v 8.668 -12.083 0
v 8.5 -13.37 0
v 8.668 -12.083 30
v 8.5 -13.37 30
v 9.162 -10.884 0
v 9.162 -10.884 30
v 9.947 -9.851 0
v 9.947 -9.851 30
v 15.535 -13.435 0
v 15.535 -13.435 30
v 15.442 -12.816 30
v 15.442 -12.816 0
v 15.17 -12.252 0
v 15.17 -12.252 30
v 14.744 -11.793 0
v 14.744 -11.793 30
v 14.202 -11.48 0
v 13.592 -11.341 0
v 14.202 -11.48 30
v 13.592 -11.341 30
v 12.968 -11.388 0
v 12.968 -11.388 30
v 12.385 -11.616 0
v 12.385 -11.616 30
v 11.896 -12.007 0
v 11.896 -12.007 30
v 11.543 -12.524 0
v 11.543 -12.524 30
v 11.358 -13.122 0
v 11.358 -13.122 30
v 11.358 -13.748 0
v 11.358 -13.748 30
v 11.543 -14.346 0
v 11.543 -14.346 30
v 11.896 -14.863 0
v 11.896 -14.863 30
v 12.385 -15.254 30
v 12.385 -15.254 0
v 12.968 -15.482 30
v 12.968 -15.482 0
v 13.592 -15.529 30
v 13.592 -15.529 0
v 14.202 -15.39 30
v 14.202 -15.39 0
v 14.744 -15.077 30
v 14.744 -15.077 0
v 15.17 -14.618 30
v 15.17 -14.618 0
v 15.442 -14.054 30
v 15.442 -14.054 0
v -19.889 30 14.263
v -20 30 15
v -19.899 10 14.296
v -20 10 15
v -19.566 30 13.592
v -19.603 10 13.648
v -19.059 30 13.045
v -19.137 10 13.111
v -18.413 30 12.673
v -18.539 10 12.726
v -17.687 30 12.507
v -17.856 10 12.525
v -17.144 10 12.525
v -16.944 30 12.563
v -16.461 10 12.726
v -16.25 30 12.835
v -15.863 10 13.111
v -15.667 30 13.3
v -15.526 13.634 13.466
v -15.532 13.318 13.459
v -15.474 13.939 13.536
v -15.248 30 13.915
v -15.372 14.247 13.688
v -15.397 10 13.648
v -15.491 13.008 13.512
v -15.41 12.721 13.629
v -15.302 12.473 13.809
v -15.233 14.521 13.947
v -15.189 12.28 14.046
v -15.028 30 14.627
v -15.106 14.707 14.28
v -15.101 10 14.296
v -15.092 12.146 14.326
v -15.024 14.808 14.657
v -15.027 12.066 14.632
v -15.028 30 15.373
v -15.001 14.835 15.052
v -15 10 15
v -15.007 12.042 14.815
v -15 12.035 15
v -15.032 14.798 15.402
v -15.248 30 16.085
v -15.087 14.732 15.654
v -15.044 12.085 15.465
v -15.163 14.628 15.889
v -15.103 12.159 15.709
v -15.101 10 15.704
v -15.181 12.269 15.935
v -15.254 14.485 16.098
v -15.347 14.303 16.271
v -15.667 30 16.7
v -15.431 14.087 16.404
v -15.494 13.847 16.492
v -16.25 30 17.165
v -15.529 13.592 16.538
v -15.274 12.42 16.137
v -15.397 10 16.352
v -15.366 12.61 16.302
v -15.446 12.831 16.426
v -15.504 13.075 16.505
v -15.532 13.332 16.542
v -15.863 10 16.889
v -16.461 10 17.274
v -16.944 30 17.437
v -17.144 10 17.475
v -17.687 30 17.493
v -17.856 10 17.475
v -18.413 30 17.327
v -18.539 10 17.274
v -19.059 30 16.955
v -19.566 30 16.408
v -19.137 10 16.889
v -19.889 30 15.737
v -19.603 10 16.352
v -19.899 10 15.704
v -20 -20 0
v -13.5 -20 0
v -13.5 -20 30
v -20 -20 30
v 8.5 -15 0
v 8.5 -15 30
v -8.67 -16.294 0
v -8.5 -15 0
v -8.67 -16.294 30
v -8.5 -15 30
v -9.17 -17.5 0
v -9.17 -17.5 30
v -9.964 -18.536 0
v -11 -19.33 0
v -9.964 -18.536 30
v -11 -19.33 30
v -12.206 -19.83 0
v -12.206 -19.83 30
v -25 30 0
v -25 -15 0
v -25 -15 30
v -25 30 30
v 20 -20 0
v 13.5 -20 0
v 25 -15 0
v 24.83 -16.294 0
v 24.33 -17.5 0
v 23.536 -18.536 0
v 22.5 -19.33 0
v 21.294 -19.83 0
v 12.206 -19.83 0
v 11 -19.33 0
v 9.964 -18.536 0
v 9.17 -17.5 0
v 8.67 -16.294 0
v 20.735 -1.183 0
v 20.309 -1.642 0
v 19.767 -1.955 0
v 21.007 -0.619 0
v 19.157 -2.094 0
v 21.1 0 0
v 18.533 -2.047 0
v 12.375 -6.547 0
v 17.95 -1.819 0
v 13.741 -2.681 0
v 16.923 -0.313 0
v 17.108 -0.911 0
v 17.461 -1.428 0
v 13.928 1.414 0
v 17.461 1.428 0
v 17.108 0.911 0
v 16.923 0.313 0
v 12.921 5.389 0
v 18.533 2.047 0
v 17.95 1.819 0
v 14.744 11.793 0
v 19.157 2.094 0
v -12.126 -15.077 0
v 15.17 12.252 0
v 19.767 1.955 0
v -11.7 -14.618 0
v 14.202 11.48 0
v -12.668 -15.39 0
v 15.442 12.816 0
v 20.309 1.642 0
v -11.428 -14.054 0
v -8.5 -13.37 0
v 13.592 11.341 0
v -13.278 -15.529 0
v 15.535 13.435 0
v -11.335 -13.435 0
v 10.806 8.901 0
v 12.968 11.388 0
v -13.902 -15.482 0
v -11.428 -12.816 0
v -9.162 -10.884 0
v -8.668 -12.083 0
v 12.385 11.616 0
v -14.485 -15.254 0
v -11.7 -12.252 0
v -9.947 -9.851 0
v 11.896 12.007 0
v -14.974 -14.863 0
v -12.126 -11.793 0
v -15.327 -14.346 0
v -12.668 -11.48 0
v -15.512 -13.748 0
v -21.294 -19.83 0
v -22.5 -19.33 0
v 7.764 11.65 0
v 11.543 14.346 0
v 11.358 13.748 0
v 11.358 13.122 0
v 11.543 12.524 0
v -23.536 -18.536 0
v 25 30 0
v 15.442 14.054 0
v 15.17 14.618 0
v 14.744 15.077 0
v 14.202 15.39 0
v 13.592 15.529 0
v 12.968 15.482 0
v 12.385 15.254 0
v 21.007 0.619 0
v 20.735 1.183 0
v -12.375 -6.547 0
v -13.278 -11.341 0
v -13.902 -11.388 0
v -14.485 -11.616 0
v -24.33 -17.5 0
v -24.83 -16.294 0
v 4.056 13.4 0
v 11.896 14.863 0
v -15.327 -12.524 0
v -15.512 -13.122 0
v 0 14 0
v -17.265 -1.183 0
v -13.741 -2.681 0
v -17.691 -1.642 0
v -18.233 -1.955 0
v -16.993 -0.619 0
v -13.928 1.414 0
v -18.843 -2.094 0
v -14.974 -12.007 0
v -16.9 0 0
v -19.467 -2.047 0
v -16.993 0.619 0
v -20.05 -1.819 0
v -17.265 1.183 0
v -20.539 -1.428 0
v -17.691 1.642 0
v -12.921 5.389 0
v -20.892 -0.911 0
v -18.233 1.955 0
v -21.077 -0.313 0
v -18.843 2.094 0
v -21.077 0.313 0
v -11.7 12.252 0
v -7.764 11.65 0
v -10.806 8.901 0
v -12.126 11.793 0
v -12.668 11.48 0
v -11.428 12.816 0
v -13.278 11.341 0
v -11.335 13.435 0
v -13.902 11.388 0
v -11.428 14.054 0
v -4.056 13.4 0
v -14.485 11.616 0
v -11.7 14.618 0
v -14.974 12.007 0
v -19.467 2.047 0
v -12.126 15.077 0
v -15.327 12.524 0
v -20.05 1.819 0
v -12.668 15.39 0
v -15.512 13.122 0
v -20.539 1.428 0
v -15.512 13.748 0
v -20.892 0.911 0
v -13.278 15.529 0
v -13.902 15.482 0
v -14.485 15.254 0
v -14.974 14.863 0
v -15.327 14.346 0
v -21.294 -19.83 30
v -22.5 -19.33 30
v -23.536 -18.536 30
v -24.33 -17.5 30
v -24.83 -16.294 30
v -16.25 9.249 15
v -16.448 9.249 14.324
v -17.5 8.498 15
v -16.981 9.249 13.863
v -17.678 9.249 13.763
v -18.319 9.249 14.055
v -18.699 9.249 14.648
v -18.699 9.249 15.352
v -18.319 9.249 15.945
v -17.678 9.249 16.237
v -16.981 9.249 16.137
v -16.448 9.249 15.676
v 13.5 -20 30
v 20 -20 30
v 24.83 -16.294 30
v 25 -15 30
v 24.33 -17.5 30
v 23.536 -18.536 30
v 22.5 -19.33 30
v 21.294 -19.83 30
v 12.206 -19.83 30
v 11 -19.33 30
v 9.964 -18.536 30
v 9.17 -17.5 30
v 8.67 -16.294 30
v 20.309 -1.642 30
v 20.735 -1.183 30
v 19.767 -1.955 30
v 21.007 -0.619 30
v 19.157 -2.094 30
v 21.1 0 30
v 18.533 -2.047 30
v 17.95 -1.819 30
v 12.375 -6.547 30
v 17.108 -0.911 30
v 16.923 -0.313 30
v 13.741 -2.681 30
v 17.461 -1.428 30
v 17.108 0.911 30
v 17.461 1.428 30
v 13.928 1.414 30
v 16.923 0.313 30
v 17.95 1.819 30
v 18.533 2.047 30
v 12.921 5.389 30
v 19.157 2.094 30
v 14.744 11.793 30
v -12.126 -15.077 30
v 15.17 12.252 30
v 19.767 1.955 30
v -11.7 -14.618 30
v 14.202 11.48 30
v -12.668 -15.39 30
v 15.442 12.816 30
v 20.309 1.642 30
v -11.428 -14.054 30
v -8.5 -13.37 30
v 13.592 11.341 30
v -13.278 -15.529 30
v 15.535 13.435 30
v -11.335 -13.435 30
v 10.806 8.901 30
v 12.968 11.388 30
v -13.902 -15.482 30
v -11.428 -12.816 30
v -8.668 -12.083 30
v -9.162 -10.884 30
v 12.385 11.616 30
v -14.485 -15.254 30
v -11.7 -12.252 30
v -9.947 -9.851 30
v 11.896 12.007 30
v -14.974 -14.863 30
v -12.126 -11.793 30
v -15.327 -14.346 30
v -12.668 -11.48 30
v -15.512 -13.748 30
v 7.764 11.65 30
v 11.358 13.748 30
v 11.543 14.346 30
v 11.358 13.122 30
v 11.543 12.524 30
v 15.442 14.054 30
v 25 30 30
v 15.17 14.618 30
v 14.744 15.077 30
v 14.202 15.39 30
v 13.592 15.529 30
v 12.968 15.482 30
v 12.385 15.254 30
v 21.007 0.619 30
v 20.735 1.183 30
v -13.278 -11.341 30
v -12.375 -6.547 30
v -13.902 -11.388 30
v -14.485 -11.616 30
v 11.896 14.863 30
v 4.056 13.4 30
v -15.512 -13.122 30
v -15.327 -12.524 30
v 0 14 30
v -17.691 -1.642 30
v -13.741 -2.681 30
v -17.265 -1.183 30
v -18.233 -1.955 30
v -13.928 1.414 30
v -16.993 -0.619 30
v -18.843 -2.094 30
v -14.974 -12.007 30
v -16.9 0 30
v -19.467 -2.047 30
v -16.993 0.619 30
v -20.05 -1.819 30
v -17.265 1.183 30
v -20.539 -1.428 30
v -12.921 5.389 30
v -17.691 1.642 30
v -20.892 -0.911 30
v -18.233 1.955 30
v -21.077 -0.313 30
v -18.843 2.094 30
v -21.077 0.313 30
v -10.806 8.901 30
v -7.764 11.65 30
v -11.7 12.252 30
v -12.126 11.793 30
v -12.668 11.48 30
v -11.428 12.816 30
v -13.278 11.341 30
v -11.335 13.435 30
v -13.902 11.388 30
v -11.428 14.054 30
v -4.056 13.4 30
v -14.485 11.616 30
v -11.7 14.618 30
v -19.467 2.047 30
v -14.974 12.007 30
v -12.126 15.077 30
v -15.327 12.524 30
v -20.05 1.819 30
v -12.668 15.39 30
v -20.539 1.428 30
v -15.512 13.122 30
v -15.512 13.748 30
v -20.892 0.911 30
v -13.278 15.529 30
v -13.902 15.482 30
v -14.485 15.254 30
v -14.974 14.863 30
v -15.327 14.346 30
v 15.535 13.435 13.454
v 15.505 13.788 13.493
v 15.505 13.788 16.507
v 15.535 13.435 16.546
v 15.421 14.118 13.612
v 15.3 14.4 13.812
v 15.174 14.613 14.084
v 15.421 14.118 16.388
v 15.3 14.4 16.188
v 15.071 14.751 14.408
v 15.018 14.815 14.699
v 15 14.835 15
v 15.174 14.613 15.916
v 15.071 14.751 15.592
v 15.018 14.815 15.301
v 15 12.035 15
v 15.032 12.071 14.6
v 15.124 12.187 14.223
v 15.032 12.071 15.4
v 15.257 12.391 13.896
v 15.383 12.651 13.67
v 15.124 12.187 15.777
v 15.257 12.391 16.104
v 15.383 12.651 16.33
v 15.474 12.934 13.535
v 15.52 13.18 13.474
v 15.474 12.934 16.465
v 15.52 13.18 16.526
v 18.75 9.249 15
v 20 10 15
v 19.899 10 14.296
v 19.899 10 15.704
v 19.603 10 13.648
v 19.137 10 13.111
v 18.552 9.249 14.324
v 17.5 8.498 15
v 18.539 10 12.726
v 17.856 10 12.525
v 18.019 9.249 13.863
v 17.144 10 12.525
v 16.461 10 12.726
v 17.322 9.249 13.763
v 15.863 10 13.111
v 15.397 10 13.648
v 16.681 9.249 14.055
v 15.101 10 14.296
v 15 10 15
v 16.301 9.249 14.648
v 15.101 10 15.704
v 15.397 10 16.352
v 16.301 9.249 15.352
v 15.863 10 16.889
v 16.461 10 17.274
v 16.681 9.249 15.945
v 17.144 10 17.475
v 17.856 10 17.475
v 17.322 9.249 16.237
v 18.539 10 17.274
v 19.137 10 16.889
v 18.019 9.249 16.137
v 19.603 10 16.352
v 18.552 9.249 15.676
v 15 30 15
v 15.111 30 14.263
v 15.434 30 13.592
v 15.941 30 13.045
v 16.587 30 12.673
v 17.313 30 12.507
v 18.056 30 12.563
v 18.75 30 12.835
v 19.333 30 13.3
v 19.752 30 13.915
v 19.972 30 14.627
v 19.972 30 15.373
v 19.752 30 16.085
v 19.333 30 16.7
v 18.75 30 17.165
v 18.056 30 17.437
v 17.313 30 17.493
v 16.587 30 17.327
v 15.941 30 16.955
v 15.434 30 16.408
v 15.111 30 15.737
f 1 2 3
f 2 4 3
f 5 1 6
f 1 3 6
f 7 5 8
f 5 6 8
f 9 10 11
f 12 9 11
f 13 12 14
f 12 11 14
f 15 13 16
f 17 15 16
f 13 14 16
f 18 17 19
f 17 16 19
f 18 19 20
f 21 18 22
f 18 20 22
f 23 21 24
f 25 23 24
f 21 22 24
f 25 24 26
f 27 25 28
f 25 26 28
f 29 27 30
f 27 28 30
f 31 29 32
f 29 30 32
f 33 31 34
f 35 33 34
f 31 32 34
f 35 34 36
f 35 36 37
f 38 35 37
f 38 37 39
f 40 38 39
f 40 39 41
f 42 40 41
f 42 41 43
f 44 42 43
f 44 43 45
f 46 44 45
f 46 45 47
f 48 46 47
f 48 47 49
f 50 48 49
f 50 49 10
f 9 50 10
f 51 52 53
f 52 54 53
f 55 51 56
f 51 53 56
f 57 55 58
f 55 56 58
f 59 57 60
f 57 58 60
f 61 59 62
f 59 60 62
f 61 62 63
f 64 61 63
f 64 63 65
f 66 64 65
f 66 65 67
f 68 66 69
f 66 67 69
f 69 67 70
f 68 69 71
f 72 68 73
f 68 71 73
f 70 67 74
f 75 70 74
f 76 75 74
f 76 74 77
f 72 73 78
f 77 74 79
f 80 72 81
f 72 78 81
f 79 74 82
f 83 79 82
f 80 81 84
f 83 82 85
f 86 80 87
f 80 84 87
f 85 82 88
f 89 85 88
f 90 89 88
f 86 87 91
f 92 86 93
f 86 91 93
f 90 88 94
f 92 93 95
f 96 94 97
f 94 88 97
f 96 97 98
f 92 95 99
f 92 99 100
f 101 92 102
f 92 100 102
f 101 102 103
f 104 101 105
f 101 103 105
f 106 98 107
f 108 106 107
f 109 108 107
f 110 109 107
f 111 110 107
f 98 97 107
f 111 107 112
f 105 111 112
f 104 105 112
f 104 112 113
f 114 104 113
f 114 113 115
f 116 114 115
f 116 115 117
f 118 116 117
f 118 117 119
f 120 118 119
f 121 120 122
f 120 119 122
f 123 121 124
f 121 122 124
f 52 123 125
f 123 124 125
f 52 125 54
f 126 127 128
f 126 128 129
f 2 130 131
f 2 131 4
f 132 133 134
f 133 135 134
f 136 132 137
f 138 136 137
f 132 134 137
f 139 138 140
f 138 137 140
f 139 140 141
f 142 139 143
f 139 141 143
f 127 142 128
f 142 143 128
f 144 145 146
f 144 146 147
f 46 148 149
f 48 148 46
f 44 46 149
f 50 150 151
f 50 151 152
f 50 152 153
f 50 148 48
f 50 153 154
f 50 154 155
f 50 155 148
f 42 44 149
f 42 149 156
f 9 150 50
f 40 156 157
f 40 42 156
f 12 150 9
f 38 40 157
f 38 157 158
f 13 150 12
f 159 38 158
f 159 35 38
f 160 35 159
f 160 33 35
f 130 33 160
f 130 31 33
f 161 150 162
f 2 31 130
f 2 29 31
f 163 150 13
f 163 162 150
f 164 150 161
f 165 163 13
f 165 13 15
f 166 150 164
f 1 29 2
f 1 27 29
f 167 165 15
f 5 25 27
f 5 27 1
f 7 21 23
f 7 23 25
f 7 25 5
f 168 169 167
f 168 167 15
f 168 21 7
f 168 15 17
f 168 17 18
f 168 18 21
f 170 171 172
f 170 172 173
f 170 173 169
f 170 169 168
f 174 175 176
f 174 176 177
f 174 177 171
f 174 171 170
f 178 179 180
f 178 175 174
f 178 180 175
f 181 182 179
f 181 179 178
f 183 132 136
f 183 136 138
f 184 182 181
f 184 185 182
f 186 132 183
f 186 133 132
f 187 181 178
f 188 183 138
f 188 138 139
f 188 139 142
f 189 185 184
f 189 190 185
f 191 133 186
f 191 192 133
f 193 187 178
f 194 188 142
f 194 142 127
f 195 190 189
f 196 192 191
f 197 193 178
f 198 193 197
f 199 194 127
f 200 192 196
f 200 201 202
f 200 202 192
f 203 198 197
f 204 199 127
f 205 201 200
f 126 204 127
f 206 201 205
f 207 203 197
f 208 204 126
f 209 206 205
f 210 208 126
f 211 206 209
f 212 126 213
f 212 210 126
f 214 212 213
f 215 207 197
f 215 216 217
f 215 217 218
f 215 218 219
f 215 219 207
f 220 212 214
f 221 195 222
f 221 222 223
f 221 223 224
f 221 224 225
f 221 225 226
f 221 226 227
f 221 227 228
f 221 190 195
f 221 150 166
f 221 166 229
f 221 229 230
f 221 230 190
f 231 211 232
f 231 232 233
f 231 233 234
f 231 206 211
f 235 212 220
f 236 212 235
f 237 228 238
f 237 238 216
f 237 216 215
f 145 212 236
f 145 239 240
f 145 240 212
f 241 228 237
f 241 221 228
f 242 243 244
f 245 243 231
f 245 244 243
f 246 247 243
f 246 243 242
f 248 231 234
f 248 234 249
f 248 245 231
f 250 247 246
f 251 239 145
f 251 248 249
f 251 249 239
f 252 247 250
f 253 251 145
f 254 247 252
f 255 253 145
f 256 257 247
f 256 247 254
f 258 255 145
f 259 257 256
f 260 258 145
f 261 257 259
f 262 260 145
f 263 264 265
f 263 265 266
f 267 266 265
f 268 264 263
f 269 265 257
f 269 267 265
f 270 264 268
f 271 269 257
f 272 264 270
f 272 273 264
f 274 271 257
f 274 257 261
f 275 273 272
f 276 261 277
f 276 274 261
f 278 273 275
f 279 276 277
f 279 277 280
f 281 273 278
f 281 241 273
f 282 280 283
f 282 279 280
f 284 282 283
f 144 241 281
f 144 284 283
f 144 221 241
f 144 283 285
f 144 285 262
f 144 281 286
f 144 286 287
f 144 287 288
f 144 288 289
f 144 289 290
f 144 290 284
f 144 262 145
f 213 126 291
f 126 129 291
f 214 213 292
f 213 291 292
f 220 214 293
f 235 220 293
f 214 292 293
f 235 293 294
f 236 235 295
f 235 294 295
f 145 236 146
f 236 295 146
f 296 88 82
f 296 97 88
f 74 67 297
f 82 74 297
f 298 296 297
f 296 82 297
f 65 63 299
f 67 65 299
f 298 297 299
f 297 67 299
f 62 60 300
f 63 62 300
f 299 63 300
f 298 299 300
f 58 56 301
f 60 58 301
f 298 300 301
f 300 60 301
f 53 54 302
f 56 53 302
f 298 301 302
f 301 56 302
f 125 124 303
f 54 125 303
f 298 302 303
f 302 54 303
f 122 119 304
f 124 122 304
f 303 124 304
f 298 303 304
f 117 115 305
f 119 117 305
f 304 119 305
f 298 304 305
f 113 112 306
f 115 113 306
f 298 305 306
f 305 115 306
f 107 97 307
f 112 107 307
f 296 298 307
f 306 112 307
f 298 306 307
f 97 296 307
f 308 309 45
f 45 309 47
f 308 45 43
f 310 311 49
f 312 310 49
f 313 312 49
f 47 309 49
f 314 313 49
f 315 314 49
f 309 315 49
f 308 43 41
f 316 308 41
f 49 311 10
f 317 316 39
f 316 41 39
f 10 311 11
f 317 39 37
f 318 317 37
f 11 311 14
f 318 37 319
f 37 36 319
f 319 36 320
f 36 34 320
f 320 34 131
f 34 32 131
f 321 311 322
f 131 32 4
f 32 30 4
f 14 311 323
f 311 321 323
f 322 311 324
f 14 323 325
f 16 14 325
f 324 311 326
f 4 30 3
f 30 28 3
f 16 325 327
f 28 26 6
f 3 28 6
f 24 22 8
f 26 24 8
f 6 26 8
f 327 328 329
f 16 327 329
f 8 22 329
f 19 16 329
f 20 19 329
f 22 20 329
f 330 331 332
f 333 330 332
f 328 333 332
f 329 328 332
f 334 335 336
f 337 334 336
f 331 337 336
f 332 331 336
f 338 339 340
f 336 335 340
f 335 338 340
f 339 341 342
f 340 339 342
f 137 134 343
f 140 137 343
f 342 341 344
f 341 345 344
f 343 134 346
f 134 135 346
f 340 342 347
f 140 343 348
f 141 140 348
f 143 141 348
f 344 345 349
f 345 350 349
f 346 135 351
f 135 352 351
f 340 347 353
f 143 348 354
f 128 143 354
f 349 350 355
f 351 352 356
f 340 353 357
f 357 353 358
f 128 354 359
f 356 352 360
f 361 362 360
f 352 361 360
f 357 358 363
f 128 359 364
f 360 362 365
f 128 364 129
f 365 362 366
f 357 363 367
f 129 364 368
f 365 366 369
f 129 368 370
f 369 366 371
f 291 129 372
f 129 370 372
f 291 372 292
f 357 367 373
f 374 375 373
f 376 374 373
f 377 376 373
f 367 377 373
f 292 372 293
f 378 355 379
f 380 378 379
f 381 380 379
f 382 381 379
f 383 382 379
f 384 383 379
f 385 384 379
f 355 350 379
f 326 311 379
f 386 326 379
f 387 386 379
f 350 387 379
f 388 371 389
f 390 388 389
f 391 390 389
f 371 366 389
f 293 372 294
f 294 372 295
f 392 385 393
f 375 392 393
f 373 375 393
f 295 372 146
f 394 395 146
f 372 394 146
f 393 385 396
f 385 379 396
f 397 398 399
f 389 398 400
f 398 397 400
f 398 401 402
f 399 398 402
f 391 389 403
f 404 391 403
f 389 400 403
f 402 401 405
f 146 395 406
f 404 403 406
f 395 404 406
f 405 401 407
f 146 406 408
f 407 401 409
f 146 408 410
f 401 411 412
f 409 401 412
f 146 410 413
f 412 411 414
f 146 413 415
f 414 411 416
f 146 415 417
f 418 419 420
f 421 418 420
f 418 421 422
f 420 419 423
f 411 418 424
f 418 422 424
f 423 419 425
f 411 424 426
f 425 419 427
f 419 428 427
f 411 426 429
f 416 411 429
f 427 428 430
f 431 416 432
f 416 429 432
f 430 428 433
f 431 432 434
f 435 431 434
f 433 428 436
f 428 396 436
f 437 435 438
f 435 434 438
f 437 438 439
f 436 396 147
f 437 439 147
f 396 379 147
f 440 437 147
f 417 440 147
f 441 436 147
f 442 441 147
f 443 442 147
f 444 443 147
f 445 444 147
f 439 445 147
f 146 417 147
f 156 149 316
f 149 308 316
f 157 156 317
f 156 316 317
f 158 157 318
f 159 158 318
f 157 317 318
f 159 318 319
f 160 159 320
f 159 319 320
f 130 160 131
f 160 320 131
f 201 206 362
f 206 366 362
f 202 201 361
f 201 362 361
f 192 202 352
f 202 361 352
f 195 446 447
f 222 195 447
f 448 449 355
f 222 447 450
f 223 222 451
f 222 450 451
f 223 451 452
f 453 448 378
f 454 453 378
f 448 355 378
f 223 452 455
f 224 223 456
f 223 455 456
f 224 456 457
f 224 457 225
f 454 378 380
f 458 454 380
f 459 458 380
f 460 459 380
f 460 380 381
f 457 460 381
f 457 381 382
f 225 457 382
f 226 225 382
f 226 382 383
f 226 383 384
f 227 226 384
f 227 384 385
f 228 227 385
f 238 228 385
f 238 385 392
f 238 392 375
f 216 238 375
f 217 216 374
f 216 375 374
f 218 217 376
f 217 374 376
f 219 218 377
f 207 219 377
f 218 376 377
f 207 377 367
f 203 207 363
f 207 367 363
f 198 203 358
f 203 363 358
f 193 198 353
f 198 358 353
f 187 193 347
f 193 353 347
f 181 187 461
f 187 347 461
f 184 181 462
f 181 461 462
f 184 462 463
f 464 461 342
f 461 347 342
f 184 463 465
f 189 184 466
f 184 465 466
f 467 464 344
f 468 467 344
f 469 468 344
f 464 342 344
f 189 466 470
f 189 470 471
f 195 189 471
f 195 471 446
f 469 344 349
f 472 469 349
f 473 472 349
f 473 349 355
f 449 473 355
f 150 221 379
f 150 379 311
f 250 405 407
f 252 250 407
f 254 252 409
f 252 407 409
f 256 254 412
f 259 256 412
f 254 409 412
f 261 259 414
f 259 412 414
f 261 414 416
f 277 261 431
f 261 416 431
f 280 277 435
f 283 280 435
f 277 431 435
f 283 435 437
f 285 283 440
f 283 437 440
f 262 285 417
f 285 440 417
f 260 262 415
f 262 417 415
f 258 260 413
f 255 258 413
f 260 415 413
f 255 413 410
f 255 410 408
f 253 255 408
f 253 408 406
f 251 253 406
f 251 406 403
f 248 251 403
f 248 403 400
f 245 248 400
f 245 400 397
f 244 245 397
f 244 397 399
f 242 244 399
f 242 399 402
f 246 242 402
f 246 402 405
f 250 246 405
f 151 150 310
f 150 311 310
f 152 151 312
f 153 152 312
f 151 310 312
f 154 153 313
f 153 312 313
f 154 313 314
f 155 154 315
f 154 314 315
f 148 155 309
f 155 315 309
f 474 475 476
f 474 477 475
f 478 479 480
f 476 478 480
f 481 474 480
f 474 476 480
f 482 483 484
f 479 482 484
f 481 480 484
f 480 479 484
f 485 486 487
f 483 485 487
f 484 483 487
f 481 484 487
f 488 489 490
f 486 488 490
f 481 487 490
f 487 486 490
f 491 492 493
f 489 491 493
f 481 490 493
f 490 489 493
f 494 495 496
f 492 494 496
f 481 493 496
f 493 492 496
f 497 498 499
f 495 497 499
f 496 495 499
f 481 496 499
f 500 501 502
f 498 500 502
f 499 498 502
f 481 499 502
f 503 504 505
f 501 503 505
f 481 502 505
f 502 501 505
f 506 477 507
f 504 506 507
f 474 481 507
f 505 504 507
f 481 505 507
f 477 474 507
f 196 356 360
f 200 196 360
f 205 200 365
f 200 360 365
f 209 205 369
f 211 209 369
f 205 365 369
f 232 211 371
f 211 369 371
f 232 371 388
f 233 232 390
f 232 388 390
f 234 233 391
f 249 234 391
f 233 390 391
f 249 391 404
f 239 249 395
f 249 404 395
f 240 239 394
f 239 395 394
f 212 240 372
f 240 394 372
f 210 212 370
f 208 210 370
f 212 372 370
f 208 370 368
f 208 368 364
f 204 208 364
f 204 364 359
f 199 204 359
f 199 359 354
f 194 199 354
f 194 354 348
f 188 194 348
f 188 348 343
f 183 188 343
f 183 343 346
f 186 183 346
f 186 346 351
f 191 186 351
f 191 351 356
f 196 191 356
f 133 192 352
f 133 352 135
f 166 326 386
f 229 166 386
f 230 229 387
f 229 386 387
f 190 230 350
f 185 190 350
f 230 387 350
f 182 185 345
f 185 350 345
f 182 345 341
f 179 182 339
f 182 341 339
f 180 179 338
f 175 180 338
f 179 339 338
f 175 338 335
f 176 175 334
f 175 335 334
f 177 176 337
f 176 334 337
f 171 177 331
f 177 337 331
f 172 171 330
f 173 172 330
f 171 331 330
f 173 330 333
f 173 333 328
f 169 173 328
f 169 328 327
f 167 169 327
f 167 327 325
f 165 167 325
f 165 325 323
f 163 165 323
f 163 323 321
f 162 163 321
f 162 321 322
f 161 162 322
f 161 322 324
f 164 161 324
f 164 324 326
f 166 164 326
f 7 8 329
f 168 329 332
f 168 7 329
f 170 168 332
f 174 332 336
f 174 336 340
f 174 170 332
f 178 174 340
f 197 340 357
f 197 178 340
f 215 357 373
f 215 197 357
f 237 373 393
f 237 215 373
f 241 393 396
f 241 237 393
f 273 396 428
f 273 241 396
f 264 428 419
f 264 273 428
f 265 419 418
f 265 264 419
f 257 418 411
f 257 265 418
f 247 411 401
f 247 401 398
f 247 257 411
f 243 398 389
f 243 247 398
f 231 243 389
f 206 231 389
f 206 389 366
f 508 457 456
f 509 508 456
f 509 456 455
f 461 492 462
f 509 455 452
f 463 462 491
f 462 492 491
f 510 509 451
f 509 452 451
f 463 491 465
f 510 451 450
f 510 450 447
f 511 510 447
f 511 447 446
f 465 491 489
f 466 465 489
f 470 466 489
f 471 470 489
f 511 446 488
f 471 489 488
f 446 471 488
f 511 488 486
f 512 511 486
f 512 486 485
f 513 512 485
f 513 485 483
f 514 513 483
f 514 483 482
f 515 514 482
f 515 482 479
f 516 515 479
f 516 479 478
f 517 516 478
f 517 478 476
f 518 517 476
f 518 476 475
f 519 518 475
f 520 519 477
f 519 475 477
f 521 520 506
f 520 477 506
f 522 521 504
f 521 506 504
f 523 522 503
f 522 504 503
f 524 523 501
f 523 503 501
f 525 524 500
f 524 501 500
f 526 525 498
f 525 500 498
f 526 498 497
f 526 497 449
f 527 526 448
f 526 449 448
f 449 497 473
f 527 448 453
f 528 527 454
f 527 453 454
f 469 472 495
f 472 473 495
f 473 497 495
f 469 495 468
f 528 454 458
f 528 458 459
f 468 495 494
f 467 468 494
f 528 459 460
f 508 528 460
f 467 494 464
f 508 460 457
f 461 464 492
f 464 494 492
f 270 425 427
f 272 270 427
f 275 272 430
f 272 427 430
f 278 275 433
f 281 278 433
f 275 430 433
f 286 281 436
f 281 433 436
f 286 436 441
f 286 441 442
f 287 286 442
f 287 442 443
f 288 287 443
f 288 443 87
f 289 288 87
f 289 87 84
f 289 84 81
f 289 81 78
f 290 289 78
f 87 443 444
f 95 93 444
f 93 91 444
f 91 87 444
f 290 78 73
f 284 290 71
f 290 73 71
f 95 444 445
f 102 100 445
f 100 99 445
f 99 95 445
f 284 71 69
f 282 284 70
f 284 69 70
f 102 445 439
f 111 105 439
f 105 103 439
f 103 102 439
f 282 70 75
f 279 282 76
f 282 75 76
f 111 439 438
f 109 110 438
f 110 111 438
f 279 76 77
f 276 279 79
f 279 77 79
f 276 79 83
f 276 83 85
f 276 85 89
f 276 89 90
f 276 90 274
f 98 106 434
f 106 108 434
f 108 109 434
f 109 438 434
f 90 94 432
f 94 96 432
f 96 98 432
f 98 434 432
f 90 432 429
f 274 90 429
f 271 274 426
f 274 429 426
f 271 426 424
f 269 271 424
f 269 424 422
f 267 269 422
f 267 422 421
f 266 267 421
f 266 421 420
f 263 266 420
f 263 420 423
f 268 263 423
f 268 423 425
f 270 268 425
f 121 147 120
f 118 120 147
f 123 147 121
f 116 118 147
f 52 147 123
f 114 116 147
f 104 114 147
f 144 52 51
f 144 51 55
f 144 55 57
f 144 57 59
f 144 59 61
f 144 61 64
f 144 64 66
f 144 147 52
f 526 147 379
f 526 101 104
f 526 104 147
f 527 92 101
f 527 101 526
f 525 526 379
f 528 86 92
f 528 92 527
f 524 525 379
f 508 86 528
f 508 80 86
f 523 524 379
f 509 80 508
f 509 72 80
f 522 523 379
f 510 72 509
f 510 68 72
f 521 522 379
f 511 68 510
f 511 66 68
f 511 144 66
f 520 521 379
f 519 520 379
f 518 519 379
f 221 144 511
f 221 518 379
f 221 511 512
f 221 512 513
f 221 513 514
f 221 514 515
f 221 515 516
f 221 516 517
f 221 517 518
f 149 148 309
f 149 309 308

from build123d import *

# Parameters (mm, degrees)
EXTRUDE1_DEPTH        = 30
FILLET1_R             = 5
M5_TAPPED_HOLE1_D     = 4.2
M6_TAPPED_HOLE1_D     = 5
M6_TAPPED_HOLE1_DEPTH = 20
M6_TAPPED_HOLE1_TIP   = 1.502151548


with BuildPart() as part:
    # Sketch1 → Extrude1 (new body)
    with BuildSketch(Plane.XY):
        with BuildLine():
            Line((-25, 30), (25, 30))
            Line((25, 30), (25, -20))
            Line((25, -20), (8.5, -20))
            Line((8.5, -20), (8.5, -11.124297731))
            ThreePointArc((8.5, -11.124297731), (0, 14), (-8.5, -11.124297731))
            Line((-8.5, -11.124297731), (-8.5, -20))
            Line((-8.5, -20), (-25, -20))
            Line((-25, -20), (-25, 30))
        make_face()
    extrude(amount=EXTRUDE1_DEPTH)

    # Fillet1
    fillet1_edges = [part.edges().sort_by_distance(p)[0] for p in [
        (-8.5, -20, 15),
        (-25, -20, 15),
        (25, -20, 15),
        (8.5, -20, 15),
        (8.5, -11.124297731, 15),
        (-8.5, -11.124297731, 15),
    ]]
    fillet(fillet1_edges, radius=FILLET1_R)

    # M5 Tapped Hole1 (through all)
    with Locations(Plane(origin=(0, 0, 0), x_dir=(-1, 0, 0), z_dir=(0, 0, -1))):
        with Locations((-13.435028843, 13.435028843), (13.435028843, 13.435028843), (19, 0), (13.435028843, -13.435028843), (-13.435028843, -13.435028843), (-19, 0)):
            Hole(M5_TAPPED_HOLE1_D / 2)

    # M6 Tapped Hole1
    with Locations(Plane(origin=(0, 30, 0), x_dir=(1, 0, 0), z_dir=(0, 1, 0))):
        with Locations((-17.5, -15), (17.5, -15)):
            Hole(M6_TAPPED_HOLE1_D / 2, depth=M6_TAPPED_HOLE1_DEPTH)
            with Locations((0, 0, -(M6_TAPPED_HOLE1_DEPTH + M6_TAPPED_HOLE1_TIP / 2))):  # 118° drill point
                Cone(0, M6_TAPPED_HOLE1_D / 2, M6_TAPPED_HOLE1_TIP, mode=Mode.SUBTRACT)


solid = part.part
